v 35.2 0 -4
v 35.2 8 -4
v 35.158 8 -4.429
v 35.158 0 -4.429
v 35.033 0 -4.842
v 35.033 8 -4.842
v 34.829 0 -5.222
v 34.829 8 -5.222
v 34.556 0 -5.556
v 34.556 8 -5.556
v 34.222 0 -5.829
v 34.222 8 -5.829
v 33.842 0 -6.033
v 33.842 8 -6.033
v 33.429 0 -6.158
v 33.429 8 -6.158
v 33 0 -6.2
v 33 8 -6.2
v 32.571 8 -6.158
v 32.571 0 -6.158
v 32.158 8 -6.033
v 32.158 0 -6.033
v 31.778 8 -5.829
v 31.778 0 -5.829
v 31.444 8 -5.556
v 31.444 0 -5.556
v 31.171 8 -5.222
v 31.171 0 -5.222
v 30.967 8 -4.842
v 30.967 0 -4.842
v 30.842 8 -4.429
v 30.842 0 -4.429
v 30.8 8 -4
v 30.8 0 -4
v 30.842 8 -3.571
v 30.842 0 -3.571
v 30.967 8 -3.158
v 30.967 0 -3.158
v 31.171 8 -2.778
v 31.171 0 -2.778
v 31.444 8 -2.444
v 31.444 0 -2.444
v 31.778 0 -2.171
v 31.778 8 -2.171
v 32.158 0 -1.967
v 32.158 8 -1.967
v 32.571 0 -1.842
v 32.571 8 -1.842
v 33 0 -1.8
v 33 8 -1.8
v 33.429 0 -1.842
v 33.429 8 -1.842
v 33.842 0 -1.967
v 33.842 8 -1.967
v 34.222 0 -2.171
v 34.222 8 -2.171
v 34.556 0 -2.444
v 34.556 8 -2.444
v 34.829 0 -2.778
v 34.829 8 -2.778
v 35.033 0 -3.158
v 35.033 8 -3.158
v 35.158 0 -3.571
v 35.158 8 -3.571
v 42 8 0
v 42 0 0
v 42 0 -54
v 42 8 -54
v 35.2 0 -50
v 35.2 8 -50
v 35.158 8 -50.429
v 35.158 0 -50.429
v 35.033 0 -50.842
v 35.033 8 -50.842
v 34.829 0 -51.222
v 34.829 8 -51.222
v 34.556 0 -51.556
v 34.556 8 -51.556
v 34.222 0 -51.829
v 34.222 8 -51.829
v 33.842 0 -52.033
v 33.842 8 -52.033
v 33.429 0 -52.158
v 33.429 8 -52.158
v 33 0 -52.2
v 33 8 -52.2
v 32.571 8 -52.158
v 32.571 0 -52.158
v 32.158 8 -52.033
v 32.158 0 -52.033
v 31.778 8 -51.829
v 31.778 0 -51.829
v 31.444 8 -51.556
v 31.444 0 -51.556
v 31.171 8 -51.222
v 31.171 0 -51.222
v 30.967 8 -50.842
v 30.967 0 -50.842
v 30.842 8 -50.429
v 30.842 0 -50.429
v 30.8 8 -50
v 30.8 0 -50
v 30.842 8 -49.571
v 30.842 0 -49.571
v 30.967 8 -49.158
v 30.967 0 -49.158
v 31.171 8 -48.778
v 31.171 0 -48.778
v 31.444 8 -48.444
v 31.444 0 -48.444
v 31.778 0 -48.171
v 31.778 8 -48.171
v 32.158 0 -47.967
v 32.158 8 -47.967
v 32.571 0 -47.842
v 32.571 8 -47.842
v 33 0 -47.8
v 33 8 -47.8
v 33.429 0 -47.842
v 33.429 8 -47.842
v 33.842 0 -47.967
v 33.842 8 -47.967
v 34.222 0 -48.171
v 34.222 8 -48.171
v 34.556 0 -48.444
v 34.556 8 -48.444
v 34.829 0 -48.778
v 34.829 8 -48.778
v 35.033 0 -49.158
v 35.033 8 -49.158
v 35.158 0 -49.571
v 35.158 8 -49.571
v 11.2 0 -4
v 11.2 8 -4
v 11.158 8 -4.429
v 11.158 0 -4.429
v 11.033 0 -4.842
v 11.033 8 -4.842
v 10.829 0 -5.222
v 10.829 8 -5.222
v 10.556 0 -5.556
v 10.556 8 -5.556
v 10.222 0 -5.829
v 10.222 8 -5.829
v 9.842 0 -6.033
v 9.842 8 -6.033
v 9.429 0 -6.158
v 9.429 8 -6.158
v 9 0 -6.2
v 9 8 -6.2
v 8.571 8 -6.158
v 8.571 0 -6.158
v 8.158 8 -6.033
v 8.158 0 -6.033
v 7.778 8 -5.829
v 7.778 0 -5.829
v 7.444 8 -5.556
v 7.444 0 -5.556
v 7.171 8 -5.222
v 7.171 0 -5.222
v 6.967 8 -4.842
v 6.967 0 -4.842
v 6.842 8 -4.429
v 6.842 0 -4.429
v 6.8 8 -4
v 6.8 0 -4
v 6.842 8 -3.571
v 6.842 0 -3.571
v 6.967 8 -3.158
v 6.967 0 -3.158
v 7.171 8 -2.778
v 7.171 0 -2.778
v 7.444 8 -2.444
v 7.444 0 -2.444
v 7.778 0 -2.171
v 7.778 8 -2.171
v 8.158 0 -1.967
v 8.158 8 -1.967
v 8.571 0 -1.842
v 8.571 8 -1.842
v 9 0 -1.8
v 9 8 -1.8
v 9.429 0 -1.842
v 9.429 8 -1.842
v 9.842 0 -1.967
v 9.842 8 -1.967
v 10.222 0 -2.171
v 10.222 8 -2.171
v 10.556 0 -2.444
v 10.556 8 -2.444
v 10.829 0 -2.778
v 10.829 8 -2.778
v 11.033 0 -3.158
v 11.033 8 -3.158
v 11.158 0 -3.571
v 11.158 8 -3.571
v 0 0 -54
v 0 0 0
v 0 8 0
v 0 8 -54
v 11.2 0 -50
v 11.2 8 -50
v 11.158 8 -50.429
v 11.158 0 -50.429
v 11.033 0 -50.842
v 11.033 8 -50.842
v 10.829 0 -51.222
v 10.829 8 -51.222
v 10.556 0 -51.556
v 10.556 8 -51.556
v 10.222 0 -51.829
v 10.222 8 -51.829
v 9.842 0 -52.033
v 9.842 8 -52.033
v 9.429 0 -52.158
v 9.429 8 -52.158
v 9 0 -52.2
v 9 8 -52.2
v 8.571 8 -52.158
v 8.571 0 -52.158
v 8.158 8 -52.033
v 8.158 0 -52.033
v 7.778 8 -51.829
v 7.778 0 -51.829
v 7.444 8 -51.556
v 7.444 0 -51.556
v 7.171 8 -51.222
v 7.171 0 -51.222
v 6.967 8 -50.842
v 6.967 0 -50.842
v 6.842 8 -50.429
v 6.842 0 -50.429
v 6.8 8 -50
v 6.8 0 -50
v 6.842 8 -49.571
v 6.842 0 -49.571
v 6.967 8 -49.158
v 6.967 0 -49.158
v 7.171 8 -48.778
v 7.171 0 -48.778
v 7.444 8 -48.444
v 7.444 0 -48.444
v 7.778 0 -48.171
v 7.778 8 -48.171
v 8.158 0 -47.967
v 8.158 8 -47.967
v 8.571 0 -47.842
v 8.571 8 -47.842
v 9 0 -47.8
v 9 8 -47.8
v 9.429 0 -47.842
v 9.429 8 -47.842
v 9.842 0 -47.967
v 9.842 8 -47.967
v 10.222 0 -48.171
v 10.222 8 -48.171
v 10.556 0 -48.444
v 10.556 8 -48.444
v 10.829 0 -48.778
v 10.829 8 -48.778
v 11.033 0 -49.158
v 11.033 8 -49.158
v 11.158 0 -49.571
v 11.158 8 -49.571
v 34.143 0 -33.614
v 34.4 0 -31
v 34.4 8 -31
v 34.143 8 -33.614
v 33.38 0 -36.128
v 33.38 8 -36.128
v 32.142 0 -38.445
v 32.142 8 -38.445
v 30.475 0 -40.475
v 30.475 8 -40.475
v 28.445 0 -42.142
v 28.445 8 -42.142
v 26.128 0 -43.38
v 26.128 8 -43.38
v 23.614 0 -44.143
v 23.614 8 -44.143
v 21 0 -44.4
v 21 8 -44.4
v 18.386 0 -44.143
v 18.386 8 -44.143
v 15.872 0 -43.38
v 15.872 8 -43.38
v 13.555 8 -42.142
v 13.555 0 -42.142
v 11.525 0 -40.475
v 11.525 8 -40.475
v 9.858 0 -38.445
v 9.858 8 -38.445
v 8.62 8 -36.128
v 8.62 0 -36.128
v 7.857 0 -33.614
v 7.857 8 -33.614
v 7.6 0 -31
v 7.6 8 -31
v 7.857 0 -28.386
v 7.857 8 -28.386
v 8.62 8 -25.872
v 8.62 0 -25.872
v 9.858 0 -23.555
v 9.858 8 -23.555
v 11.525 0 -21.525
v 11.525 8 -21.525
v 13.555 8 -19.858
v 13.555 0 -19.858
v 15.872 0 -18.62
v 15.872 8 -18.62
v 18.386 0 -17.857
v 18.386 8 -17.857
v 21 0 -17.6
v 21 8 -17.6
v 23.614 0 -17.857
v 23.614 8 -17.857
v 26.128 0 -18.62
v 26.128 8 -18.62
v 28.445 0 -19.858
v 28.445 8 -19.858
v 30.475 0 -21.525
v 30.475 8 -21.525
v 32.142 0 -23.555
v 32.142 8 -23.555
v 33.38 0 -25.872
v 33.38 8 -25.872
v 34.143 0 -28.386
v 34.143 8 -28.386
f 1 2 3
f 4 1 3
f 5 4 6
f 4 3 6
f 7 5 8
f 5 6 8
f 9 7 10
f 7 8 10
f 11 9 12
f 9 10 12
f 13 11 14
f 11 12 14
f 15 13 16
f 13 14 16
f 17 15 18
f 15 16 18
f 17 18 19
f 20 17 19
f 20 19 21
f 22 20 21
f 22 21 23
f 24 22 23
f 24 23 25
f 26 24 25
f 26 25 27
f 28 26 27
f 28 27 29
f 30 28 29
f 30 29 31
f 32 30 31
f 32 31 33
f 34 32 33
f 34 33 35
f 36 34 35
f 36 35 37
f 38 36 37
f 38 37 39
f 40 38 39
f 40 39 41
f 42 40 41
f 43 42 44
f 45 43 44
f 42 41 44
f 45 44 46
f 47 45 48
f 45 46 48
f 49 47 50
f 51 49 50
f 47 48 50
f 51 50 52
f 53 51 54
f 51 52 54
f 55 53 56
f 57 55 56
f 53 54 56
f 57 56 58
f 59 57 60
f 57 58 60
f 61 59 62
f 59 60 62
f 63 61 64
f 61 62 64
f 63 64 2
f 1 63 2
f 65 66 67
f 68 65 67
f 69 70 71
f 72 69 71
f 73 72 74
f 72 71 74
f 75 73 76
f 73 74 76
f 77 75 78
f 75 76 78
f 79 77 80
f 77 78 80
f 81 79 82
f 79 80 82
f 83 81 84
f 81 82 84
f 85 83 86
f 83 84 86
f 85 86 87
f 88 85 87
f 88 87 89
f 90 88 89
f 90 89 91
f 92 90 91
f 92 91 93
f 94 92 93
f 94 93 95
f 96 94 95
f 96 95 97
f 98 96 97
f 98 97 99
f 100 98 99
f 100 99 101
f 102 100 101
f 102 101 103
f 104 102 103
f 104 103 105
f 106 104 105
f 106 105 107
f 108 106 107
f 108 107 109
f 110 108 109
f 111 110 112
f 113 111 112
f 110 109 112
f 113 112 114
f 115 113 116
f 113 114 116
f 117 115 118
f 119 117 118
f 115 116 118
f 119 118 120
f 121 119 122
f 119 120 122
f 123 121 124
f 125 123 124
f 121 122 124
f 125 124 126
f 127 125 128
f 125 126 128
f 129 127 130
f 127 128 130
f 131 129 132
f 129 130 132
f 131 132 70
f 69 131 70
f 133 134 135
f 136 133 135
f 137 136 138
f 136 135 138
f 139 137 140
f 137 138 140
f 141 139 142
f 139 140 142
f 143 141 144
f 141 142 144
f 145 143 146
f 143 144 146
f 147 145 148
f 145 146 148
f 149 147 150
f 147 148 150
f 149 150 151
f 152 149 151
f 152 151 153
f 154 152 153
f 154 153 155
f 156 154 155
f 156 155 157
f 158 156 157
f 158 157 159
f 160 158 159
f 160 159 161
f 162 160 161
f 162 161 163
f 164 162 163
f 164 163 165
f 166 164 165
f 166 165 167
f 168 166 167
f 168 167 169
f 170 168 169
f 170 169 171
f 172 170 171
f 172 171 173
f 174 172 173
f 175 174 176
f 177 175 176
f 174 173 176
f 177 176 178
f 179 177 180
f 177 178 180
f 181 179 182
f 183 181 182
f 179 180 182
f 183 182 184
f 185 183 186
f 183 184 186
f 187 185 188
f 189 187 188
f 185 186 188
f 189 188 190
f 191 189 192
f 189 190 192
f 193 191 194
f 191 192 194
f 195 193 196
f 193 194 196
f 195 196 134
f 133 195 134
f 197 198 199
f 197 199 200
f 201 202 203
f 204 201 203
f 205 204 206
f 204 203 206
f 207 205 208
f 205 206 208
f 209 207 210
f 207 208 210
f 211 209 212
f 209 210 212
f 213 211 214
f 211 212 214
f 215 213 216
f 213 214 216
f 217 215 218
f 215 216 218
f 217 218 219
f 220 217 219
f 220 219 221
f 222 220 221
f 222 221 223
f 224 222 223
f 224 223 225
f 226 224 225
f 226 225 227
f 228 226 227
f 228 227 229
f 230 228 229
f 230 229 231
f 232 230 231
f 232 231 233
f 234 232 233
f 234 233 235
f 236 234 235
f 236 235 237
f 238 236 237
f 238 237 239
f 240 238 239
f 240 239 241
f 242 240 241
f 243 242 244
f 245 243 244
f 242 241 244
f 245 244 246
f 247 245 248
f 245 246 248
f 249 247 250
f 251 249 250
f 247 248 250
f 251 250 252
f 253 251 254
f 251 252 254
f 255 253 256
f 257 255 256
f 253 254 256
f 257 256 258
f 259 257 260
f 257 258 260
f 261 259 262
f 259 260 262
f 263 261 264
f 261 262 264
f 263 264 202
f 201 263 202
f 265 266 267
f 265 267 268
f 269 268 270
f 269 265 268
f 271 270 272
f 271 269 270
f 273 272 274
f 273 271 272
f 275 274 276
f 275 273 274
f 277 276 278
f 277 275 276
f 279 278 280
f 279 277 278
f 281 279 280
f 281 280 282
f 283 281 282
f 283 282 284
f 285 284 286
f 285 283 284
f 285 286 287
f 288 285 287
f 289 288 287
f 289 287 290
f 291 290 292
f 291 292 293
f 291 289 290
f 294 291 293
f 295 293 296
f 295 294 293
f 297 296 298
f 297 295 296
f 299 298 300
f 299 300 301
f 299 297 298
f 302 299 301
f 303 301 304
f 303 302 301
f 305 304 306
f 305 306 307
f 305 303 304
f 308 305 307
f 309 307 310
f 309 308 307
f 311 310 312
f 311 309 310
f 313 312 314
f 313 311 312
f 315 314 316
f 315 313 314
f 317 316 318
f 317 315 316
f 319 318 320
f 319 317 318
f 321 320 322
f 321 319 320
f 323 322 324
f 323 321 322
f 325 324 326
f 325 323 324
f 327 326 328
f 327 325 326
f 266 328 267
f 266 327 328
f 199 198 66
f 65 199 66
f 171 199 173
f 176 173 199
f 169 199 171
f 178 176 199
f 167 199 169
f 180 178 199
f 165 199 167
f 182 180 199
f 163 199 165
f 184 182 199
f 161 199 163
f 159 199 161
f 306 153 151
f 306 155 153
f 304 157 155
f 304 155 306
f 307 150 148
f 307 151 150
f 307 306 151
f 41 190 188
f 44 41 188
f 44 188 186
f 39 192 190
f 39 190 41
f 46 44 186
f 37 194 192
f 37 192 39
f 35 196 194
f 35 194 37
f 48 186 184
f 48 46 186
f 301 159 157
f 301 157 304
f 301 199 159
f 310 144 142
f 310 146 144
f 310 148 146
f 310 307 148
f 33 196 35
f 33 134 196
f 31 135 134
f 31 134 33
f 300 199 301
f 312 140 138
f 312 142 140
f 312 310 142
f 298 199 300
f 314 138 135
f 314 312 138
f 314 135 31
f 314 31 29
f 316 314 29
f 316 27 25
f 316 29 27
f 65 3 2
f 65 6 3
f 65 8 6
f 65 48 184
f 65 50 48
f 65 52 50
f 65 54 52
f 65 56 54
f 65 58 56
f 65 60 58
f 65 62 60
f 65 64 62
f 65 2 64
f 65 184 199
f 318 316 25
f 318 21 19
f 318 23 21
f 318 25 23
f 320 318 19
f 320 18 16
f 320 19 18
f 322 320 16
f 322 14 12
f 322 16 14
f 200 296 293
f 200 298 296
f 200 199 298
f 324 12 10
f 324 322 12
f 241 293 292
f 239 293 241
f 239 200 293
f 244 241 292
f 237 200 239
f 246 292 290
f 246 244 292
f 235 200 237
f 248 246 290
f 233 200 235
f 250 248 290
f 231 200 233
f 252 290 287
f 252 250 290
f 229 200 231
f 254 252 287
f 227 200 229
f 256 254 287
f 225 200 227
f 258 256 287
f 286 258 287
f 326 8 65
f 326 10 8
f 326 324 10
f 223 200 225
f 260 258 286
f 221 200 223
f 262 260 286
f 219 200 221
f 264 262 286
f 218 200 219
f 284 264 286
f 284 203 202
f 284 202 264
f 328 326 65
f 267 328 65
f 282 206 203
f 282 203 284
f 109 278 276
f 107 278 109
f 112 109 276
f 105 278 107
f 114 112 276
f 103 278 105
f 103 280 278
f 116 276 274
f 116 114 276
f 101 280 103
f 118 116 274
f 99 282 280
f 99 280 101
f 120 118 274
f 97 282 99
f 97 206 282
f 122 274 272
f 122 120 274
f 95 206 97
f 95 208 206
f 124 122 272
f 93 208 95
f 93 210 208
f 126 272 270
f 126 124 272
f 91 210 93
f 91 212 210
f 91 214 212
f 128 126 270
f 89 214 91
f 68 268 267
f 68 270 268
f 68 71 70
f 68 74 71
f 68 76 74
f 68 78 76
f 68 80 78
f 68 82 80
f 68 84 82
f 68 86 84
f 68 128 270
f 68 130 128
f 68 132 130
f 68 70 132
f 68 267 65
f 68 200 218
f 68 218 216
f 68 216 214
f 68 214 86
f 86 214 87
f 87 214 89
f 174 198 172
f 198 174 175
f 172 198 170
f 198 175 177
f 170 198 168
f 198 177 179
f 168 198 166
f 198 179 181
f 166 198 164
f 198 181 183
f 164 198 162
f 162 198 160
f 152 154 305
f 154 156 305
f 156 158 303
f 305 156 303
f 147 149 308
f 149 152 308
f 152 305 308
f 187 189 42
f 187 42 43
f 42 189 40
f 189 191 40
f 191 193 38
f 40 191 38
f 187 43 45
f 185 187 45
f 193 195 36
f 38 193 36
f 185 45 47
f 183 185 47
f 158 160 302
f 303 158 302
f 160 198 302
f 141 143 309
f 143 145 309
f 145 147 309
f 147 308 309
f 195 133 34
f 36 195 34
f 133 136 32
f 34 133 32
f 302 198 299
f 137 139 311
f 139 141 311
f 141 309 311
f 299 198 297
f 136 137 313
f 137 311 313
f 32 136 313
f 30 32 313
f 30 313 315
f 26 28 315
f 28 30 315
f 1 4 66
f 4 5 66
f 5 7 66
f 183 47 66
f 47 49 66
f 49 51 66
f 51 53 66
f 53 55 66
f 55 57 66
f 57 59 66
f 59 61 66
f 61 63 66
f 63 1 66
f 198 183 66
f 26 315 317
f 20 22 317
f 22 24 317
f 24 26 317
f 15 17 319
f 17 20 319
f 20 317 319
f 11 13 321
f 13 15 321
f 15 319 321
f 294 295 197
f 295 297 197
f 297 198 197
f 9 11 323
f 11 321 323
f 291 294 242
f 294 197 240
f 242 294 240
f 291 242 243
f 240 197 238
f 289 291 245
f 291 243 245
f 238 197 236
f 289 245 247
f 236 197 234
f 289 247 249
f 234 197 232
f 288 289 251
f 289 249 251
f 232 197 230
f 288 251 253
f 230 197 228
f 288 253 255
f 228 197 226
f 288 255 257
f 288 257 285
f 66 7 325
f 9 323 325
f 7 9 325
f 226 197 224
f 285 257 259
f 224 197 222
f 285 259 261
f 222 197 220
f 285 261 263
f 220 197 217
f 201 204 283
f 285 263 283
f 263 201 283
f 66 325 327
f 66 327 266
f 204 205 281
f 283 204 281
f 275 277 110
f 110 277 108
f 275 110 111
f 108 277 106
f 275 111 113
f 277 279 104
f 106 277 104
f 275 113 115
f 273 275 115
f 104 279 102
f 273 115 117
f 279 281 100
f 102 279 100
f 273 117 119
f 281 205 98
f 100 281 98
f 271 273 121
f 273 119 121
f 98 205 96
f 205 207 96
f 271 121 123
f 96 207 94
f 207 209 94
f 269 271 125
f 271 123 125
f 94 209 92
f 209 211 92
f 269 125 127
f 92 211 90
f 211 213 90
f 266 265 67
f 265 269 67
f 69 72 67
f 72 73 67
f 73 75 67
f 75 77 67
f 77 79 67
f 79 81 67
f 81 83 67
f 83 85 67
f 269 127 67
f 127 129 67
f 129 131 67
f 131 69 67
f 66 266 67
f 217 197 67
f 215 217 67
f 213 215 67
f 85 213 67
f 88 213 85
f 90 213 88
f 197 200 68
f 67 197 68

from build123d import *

# Parameters (mm, degrees)
ESQUISSE1_W             = 42
ESQUISSE1_H             = 62
ESQUISSE1_R             = 13.4
BOSS_EXTRU_1_DEPTH      = 8
ENL_V_MAT_EXTRU_2_REACH = 10
ESQUISSE3_W             = 42
ESQUISSE3_H             = 8
ESQUISSE2_R             = 2.2
ENL_V_MAT_EXTRU_1_DEPTH = 9


with BuildPart() as part:
    # Esquisse1 → Boss.-Extru.1 (new body)
    with BuildSketch(Plane(origin=(0, 0, 0), x_dir=(1, 0, 0), z_dir=(0, 1, 0))):
        with Locations((21, 31)):
            Rectangle(ESQUISSE1_W, ESQUISSE1_H)
        with Locations((21, 31)):
            Circle(ESQUISSE1_R, mode=Mode.SUBTRACT)
    extrude(amount=BOSS_EXTRU_1_DEPTH)

    # Esquisse3 → Enlèv. mat.-Extru.2 (cut, up to next)
    with BuildSketch(Plane(origin=(0, 8, 0), x_dir=(1, 0, 0), z_dir=(0, 1, 0)), mode=Mode.PRIVATE) as enl_v_mat_extru_2_sk1:
        with Locations((21, 58)):
            Rectangle(ESQUISSE3_W, ESQUISSE3_H)
    enl_v_mat_extru_2_tool1 = extrude(enl_v_mat_extru_2_sk1.sketch, amount=-ENL_V_MAT_EXTRU_2_REACH, mode=Mode.PRIVATE) & part.part
    add(enl_v_mat_extru_2_tool1.solids().sort_by_distance((21, 8, -58))[0], mode=Mode.SUBTRACT)

    # Esquisse2 → Enlèv. mat.-Extru.1 (cut, through all)
    with BuildSketch(Plane(origin=(0, 8, 0), x_dir=(1, 0, 0), z_dir=(0, 1, 0))):
        with Locations((9, 50)):
            Circle(ESQUISSE2_R)
        with Locations((33, 50)):
            Circle(ESQUISSE2_R)
        with Locations((33, 4)):
            Circle(ESQUISSE2_R)
        with Locations((9, 4)):
            Circle(ESQUISSE2_R)
    extrude(amount=-ENL_V_MAT_EXTRU_1_DEPTH, mode=Mode.SUBTRACT)


solid = part.part
